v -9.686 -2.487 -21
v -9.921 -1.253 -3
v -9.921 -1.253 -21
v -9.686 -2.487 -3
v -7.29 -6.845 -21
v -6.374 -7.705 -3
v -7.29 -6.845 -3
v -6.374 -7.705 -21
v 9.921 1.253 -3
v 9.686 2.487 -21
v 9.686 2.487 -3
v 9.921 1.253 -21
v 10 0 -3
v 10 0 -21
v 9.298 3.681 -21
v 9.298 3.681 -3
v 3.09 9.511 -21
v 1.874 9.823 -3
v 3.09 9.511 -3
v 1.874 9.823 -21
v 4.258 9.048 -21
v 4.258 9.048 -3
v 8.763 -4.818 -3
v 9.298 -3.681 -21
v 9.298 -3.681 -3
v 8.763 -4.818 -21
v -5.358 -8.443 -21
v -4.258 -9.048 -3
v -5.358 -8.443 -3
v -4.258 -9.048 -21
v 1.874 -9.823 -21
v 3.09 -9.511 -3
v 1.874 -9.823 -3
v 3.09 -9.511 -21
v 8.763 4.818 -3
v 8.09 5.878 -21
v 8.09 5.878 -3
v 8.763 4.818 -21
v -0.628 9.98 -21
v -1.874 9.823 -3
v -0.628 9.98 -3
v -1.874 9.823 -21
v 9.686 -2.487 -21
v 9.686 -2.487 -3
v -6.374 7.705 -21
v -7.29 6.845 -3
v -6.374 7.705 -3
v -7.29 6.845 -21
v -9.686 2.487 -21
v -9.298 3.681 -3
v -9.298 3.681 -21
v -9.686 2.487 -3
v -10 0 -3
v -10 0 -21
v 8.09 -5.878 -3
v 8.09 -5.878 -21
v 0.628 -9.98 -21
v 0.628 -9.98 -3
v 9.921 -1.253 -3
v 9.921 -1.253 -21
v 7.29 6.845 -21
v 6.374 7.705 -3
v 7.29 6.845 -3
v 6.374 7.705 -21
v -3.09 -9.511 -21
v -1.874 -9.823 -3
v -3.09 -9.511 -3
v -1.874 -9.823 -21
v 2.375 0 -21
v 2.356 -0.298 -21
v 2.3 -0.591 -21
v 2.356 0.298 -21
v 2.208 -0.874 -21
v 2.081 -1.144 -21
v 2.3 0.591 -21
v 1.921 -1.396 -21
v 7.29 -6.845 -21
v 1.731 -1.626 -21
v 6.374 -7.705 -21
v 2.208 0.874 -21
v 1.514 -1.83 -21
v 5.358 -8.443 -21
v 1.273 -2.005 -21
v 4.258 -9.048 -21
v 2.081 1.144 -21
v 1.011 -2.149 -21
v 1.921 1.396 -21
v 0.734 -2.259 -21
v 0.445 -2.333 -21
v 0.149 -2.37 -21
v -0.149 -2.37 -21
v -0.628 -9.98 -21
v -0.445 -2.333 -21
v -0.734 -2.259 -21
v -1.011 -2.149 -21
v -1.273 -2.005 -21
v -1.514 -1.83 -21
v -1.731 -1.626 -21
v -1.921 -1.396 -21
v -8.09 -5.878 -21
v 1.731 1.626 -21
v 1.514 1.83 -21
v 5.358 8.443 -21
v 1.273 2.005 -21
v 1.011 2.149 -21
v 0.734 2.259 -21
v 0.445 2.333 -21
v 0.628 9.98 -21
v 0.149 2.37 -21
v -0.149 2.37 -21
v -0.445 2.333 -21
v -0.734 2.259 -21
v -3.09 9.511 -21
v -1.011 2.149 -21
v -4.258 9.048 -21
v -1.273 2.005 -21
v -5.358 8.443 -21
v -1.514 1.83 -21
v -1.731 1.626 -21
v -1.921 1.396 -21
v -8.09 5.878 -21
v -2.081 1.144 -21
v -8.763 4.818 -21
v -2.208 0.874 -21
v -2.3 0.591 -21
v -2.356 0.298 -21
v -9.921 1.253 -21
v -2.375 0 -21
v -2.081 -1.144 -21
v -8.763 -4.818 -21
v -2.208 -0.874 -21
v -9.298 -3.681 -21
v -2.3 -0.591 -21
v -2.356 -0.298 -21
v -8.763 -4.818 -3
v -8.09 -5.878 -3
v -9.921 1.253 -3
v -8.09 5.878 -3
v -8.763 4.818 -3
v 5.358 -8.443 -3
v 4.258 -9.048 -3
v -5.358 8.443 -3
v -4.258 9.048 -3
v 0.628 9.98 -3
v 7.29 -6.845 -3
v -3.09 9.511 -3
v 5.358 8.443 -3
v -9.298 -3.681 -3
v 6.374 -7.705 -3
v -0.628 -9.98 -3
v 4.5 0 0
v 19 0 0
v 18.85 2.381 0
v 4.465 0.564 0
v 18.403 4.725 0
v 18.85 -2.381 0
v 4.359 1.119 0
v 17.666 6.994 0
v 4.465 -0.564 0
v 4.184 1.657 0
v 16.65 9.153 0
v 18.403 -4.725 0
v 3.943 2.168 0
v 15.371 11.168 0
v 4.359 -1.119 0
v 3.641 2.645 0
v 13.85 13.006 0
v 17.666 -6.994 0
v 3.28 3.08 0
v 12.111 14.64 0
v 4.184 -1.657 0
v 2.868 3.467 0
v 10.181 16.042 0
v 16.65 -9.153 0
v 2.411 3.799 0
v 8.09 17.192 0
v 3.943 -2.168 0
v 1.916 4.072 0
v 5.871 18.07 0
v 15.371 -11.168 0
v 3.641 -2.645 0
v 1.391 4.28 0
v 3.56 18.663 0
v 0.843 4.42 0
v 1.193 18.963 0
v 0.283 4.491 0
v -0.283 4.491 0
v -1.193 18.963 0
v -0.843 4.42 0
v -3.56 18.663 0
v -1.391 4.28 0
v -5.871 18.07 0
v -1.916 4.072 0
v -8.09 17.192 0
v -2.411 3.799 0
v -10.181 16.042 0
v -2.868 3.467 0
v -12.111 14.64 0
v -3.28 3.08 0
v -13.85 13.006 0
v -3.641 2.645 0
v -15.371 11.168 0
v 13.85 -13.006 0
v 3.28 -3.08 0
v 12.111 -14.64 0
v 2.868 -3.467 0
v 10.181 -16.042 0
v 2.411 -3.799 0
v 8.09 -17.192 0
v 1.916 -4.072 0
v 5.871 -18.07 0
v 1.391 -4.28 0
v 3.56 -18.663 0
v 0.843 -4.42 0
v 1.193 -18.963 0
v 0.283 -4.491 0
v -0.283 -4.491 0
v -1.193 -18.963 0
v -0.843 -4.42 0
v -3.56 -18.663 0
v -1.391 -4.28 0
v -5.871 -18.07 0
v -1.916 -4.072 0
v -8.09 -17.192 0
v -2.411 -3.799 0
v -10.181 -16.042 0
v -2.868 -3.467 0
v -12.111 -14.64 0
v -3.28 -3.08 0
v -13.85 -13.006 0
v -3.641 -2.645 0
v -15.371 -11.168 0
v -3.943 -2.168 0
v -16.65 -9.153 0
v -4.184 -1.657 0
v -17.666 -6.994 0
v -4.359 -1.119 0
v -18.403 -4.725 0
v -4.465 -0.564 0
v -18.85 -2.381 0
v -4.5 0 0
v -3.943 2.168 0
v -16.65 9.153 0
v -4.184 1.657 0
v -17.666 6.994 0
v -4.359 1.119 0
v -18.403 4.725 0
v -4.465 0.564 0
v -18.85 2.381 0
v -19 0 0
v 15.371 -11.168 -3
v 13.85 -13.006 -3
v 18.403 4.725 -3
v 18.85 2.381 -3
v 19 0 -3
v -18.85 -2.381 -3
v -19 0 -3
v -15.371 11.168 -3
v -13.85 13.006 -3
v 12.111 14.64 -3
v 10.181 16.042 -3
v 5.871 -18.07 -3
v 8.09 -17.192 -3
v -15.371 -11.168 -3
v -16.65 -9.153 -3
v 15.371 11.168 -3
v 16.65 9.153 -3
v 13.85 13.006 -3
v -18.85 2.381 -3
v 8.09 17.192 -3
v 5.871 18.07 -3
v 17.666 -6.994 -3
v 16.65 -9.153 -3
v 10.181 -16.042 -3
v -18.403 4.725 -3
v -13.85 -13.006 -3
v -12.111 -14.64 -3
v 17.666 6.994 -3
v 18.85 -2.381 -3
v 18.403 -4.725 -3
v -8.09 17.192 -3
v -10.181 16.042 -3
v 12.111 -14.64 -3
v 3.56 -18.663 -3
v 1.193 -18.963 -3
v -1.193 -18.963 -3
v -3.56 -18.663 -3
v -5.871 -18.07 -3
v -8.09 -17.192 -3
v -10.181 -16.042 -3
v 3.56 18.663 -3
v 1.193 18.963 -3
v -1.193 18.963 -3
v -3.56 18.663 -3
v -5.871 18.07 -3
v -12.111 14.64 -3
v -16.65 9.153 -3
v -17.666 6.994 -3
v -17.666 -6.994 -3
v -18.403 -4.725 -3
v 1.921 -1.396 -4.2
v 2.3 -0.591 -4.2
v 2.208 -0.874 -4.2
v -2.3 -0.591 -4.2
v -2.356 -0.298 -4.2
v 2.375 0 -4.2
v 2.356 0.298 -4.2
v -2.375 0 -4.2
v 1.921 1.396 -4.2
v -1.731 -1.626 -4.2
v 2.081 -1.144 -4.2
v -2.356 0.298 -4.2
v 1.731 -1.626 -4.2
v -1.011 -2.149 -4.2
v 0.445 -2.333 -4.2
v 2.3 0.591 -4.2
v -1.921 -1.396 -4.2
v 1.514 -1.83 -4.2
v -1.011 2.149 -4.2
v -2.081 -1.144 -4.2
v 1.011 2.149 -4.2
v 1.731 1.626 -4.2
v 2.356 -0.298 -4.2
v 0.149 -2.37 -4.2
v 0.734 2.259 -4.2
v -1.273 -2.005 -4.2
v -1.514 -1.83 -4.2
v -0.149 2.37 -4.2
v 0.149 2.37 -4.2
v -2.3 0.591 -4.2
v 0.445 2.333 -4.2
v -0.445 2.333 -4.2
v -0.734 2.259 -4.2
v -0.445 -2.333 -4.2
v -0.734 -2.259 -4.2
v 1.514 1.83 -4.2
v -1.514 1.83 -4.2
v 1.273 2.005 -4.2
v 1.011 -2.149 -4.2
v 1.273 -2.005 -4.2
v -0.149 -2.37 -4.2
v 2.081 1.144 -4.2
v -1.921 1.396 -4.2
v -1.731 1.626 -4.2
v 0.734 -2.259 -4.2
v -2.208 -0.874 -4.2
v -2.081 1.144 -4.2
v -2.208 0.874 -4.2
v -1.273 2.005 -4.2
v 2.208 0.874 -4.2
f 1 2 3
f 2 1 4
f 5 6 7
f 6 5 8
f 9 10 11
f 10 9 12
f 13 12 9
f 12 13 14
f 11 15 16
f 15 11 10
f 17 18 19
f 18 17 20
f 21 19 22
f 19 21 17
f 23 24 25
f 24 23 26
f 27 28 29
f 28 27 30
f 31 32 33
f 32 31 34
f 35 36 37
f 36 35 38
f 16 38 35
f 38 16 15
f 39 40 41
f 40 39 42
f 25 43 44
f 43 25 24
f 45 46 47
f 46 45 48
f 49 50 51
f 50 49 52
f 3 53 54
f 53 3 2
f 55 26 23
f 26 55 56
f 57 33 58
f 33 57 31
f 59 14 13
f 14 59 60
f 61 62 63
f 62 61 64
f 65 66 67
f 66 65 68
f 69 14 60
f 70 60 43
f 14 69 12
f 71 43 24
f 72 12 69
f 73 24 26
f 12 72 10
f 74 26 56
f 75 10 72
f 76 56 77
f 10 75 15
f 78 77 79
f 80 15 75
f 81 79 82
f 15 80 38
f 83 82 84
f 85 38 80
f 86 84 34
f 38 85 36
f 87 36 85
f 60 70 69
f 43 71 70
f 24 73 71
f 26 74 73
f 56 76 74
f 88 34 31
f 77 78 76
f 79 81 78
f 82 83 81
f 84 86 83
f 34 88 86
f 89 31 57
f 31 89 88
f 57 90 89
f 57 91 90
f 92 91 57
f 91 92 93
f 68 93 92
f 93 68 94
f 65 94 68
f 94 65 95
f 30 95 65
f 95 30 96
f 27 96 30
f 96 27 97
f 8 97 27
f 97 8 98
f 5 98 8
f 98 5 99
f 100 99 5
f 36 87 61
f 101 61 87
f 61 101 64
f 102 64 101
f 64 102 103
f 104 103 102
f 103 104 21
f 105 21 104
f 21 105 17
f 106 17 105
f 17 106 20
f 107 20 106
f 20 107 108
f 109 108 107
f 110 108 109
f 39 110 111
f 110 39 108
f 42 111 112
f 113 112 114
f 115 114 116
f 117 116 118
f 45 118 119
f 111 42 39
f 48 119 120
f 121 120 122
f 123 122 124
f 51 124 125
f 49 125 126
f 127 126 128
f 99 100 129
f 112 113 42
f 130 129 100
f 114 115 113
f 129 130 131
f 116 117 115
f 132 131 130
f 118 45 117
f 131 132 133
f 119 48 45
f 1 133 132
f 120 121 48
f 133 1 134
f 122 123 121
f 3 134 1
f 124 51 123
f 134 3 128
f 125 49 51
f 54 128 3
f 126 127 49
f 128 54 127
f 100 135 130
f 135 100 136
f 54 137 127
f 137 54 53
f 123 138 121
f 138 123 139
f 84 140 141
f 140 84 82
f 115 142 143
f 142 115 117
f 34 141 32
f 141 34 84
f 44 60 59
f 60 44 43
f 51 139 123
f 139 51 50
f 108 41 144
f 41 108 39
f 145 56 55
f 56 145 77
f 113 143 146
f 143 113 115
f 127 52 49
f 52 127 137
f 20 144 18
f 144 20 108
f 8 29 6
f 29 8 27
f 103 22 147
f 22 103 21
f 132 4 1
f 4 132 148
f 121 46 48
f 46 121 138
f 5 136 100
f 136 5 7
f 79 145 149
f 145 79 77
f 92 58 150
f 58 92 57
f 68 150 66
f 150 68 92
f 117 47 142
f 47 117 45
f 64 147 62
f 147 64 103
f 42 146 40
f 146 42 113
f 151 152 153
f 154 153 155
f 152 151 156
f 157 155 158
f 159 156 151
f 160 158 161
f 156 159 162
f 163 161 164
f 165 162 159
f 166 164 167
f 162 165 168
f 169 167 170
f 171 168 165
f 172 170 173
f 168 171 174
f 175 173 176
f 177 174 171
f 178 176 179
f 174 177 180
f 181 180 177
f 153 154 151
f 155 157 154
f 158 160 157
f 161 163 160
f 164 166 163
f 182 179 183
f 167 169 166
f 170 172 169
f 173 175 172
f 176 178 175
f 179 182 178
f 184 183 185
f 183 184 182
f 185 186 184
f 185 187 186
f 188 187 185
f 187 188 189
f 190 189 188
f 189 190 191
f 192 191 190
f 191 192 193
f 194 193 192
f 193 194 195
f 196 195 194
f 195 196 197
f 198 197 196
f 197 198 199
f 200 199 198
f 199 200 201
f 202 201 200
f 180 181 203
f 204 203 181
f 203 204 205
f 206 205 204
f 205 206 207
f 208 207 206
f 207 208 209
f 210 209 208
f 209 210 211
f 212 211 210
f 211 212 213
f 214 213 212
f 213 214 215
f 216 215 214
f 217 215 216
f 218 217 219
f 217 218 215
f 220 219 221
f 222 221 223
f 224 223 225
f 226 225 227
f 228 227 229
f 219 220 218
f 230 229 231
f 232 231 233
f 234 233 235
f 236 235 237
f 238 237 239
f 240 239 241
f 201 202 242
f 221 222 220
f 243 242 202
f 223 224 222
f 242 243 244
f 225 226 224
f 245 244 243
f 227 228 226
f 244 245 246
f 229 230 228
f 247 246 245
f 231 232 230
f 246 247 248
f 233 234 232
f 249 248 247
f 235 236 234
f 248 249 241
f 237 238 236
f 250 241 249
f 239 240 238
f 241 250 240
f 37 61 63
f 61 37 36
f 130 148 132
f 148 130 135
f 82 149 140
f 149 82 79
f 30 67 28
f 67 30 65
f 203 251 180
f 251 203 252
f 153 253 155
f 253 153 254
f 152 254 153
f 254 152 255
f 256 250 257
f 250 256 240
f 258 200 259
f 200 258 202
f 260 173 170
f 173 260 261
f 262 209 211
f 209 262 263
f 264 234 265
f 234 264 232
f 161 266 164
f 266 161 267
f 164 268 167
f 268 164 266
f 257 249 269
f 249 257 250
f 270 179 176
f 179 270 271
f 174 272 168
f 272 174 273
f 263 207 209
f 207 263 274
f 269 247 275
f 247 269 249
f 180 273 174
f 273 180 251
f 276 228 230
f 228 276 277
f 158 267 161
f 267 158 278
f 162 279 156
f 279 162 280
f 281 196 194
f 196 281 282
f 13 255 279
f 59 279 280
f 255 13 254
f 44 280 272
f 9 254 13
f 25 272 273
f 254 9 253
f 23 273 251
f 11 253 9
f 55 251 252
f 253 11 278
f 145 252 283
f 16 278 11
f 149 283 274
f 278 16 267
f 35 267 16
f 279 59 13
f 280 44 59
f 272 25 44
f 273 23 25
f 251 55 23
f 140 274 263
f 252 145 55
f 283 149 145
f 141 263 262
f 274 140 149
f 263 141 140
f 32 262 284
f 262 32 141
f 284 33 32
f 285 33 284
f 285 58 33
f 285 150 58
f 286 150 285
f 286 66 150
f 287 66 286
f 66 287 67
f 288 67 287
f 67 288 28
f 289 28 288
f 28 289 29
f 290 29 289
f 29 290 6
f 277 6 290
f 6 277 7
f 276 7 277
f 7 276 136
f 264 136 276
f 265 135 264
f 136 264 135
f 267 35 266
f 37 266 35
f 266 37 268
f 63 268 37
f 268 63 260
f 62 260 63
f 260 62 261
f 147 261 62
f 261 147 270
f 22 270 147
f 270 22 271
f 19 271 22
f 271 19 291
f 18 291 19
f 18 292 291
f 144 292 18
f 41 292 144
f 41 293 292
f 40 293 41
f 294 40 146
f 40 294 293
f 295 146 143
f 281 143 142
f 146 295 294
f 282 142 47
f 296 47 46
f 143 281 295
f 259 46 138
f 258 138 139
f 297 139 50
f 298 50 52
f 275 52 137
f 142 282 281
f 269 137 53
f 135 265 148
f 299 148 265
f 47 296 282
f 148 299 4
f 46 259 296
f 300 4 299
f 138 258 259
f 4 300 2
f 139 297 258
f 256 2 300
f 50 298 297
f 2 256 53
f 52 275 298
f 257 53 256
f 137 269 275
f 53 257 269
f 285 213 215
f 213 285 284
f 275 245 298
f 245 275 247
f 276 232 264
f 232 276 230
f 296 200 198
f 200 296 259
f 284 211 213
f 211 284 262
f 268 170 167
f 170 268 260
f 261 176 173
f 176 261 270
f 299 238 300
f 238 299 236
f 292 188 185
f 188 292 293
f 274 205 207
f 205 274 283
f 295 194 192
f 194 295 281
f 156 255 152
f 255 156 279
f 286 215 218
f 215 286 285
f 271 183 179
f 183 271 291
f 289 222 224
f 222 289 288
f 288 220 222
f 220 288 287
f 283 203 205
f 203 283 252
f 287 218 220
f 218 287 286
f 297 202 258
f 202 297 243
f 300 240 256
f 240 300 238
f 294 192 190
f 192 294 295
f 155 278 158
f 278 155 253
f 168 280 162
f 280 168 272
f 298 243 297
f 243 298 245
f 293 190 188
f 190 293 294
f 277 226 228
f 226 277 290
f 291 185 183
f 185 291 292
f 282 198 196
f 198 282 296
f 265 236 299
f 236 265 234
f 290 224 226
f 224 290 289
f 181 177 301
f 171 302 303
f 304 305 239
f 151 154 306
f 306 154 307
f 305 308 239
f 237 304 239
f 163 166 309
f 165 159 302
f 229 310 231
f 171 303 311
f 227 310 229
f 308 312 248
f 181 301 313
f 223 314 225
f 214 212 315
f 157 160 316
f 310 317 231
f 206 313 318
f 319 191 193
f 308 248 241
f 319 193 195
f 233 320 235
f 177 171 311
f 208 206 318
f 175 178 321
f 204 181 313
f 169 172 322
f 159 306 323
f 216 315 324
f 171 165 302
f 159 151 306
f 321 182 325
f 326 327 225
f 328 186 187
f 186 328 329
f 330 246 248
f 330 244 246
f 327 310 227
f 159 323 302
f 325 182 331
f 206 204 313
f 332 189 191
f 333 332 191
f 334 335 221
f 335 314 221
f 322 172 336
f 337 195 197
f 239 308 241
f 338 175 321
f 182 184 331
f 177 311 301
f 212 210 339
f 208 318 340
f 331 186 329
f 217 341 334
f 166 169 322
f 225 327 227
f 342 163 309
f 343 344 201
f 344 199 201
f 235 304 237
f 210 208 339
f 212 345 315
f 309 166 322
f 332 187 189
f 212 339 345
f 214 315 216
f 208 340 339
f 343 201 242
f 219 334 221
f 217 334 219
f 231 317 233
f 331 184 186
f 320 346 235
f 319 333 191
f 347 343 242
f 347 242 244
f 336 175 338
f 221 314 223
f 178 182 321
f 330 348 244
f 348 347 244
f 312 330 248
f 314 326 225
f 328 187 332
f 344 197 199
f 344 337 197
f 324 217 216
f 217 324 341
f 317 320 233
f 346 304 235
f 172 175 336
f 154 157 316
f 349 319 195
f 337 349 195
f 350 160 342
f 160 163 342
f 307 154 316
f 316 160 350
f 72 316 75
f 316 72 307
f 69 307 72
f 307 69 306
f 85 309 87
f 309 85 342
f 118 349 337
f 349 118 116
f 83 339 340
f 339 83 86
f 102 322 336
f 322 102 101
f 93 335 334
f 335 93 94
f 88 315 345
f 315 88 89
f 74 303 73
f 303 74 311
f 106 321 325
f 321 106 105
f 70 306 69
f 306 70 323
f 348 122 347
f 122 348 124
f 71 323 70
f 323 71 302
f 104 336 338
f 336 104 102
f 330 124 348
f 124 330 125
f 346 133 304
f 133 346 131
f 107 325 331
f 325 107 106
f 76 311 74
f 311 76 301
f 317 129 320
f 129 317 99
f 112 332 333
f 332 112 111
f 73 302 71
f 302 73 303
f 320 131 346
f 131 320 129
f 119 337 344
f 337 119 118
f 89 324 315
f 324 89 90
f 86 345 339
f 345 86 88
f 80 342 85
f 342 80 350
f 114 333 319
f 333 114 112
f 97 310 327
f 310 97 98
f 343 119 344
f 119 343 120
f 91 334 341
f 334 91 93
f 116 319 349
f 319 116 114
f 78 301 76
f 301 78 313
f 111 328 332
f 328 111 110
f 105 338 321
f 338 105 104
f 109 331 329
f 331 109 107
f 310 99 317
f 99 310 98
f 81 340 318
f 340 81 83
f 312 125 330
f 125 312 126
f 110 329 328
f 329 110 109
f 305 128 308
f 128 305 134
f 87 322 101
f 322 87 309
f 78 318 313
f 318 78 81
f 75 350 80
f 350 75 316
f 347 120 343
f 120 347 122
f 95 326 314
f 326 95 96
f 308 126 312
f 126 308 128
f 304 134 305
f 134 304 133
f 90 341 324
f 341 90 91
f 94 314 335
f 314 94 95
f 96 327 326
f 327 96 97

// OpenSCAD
$fn = 50;


difference() {
	union() {
		translate(v = [0, 0, -21.0000000000]) {
			cylinder(h = 21, r = 10.0000000000);
		}
		translate(v = [0, 0, -3.0000000000]) {
			cylinder(h = 3, r = 19.0000000000);
		}
	}
	union() {
		translate(v = [0, 0, 0]) {
			rotate(a = [0, 0, 0]) {
				difference() {
					union() {
						#translate(v = [0, 0, -21.0000000000]) {
							cylinder(h = 21, r = 2.2500000000);
						}
						#translate(v = [0, 0, -4.2000000000]) {
							cylinder(h = 4.2000000000, r = 10.0000000000, r1 = 2.3750000000, r2 = 4.5000000000);
						}
						#translate(v = [0, 0, -21.0000000000]) {
							cylinder(h = 21, r = 2.3750000000);
						}
						#translate(v = [0, 0, -21.0000000000]) {
							cylinder(h = 21, r = 2.2500000000);
						}
					}
					union();
				}
			}
		}
	}
}
